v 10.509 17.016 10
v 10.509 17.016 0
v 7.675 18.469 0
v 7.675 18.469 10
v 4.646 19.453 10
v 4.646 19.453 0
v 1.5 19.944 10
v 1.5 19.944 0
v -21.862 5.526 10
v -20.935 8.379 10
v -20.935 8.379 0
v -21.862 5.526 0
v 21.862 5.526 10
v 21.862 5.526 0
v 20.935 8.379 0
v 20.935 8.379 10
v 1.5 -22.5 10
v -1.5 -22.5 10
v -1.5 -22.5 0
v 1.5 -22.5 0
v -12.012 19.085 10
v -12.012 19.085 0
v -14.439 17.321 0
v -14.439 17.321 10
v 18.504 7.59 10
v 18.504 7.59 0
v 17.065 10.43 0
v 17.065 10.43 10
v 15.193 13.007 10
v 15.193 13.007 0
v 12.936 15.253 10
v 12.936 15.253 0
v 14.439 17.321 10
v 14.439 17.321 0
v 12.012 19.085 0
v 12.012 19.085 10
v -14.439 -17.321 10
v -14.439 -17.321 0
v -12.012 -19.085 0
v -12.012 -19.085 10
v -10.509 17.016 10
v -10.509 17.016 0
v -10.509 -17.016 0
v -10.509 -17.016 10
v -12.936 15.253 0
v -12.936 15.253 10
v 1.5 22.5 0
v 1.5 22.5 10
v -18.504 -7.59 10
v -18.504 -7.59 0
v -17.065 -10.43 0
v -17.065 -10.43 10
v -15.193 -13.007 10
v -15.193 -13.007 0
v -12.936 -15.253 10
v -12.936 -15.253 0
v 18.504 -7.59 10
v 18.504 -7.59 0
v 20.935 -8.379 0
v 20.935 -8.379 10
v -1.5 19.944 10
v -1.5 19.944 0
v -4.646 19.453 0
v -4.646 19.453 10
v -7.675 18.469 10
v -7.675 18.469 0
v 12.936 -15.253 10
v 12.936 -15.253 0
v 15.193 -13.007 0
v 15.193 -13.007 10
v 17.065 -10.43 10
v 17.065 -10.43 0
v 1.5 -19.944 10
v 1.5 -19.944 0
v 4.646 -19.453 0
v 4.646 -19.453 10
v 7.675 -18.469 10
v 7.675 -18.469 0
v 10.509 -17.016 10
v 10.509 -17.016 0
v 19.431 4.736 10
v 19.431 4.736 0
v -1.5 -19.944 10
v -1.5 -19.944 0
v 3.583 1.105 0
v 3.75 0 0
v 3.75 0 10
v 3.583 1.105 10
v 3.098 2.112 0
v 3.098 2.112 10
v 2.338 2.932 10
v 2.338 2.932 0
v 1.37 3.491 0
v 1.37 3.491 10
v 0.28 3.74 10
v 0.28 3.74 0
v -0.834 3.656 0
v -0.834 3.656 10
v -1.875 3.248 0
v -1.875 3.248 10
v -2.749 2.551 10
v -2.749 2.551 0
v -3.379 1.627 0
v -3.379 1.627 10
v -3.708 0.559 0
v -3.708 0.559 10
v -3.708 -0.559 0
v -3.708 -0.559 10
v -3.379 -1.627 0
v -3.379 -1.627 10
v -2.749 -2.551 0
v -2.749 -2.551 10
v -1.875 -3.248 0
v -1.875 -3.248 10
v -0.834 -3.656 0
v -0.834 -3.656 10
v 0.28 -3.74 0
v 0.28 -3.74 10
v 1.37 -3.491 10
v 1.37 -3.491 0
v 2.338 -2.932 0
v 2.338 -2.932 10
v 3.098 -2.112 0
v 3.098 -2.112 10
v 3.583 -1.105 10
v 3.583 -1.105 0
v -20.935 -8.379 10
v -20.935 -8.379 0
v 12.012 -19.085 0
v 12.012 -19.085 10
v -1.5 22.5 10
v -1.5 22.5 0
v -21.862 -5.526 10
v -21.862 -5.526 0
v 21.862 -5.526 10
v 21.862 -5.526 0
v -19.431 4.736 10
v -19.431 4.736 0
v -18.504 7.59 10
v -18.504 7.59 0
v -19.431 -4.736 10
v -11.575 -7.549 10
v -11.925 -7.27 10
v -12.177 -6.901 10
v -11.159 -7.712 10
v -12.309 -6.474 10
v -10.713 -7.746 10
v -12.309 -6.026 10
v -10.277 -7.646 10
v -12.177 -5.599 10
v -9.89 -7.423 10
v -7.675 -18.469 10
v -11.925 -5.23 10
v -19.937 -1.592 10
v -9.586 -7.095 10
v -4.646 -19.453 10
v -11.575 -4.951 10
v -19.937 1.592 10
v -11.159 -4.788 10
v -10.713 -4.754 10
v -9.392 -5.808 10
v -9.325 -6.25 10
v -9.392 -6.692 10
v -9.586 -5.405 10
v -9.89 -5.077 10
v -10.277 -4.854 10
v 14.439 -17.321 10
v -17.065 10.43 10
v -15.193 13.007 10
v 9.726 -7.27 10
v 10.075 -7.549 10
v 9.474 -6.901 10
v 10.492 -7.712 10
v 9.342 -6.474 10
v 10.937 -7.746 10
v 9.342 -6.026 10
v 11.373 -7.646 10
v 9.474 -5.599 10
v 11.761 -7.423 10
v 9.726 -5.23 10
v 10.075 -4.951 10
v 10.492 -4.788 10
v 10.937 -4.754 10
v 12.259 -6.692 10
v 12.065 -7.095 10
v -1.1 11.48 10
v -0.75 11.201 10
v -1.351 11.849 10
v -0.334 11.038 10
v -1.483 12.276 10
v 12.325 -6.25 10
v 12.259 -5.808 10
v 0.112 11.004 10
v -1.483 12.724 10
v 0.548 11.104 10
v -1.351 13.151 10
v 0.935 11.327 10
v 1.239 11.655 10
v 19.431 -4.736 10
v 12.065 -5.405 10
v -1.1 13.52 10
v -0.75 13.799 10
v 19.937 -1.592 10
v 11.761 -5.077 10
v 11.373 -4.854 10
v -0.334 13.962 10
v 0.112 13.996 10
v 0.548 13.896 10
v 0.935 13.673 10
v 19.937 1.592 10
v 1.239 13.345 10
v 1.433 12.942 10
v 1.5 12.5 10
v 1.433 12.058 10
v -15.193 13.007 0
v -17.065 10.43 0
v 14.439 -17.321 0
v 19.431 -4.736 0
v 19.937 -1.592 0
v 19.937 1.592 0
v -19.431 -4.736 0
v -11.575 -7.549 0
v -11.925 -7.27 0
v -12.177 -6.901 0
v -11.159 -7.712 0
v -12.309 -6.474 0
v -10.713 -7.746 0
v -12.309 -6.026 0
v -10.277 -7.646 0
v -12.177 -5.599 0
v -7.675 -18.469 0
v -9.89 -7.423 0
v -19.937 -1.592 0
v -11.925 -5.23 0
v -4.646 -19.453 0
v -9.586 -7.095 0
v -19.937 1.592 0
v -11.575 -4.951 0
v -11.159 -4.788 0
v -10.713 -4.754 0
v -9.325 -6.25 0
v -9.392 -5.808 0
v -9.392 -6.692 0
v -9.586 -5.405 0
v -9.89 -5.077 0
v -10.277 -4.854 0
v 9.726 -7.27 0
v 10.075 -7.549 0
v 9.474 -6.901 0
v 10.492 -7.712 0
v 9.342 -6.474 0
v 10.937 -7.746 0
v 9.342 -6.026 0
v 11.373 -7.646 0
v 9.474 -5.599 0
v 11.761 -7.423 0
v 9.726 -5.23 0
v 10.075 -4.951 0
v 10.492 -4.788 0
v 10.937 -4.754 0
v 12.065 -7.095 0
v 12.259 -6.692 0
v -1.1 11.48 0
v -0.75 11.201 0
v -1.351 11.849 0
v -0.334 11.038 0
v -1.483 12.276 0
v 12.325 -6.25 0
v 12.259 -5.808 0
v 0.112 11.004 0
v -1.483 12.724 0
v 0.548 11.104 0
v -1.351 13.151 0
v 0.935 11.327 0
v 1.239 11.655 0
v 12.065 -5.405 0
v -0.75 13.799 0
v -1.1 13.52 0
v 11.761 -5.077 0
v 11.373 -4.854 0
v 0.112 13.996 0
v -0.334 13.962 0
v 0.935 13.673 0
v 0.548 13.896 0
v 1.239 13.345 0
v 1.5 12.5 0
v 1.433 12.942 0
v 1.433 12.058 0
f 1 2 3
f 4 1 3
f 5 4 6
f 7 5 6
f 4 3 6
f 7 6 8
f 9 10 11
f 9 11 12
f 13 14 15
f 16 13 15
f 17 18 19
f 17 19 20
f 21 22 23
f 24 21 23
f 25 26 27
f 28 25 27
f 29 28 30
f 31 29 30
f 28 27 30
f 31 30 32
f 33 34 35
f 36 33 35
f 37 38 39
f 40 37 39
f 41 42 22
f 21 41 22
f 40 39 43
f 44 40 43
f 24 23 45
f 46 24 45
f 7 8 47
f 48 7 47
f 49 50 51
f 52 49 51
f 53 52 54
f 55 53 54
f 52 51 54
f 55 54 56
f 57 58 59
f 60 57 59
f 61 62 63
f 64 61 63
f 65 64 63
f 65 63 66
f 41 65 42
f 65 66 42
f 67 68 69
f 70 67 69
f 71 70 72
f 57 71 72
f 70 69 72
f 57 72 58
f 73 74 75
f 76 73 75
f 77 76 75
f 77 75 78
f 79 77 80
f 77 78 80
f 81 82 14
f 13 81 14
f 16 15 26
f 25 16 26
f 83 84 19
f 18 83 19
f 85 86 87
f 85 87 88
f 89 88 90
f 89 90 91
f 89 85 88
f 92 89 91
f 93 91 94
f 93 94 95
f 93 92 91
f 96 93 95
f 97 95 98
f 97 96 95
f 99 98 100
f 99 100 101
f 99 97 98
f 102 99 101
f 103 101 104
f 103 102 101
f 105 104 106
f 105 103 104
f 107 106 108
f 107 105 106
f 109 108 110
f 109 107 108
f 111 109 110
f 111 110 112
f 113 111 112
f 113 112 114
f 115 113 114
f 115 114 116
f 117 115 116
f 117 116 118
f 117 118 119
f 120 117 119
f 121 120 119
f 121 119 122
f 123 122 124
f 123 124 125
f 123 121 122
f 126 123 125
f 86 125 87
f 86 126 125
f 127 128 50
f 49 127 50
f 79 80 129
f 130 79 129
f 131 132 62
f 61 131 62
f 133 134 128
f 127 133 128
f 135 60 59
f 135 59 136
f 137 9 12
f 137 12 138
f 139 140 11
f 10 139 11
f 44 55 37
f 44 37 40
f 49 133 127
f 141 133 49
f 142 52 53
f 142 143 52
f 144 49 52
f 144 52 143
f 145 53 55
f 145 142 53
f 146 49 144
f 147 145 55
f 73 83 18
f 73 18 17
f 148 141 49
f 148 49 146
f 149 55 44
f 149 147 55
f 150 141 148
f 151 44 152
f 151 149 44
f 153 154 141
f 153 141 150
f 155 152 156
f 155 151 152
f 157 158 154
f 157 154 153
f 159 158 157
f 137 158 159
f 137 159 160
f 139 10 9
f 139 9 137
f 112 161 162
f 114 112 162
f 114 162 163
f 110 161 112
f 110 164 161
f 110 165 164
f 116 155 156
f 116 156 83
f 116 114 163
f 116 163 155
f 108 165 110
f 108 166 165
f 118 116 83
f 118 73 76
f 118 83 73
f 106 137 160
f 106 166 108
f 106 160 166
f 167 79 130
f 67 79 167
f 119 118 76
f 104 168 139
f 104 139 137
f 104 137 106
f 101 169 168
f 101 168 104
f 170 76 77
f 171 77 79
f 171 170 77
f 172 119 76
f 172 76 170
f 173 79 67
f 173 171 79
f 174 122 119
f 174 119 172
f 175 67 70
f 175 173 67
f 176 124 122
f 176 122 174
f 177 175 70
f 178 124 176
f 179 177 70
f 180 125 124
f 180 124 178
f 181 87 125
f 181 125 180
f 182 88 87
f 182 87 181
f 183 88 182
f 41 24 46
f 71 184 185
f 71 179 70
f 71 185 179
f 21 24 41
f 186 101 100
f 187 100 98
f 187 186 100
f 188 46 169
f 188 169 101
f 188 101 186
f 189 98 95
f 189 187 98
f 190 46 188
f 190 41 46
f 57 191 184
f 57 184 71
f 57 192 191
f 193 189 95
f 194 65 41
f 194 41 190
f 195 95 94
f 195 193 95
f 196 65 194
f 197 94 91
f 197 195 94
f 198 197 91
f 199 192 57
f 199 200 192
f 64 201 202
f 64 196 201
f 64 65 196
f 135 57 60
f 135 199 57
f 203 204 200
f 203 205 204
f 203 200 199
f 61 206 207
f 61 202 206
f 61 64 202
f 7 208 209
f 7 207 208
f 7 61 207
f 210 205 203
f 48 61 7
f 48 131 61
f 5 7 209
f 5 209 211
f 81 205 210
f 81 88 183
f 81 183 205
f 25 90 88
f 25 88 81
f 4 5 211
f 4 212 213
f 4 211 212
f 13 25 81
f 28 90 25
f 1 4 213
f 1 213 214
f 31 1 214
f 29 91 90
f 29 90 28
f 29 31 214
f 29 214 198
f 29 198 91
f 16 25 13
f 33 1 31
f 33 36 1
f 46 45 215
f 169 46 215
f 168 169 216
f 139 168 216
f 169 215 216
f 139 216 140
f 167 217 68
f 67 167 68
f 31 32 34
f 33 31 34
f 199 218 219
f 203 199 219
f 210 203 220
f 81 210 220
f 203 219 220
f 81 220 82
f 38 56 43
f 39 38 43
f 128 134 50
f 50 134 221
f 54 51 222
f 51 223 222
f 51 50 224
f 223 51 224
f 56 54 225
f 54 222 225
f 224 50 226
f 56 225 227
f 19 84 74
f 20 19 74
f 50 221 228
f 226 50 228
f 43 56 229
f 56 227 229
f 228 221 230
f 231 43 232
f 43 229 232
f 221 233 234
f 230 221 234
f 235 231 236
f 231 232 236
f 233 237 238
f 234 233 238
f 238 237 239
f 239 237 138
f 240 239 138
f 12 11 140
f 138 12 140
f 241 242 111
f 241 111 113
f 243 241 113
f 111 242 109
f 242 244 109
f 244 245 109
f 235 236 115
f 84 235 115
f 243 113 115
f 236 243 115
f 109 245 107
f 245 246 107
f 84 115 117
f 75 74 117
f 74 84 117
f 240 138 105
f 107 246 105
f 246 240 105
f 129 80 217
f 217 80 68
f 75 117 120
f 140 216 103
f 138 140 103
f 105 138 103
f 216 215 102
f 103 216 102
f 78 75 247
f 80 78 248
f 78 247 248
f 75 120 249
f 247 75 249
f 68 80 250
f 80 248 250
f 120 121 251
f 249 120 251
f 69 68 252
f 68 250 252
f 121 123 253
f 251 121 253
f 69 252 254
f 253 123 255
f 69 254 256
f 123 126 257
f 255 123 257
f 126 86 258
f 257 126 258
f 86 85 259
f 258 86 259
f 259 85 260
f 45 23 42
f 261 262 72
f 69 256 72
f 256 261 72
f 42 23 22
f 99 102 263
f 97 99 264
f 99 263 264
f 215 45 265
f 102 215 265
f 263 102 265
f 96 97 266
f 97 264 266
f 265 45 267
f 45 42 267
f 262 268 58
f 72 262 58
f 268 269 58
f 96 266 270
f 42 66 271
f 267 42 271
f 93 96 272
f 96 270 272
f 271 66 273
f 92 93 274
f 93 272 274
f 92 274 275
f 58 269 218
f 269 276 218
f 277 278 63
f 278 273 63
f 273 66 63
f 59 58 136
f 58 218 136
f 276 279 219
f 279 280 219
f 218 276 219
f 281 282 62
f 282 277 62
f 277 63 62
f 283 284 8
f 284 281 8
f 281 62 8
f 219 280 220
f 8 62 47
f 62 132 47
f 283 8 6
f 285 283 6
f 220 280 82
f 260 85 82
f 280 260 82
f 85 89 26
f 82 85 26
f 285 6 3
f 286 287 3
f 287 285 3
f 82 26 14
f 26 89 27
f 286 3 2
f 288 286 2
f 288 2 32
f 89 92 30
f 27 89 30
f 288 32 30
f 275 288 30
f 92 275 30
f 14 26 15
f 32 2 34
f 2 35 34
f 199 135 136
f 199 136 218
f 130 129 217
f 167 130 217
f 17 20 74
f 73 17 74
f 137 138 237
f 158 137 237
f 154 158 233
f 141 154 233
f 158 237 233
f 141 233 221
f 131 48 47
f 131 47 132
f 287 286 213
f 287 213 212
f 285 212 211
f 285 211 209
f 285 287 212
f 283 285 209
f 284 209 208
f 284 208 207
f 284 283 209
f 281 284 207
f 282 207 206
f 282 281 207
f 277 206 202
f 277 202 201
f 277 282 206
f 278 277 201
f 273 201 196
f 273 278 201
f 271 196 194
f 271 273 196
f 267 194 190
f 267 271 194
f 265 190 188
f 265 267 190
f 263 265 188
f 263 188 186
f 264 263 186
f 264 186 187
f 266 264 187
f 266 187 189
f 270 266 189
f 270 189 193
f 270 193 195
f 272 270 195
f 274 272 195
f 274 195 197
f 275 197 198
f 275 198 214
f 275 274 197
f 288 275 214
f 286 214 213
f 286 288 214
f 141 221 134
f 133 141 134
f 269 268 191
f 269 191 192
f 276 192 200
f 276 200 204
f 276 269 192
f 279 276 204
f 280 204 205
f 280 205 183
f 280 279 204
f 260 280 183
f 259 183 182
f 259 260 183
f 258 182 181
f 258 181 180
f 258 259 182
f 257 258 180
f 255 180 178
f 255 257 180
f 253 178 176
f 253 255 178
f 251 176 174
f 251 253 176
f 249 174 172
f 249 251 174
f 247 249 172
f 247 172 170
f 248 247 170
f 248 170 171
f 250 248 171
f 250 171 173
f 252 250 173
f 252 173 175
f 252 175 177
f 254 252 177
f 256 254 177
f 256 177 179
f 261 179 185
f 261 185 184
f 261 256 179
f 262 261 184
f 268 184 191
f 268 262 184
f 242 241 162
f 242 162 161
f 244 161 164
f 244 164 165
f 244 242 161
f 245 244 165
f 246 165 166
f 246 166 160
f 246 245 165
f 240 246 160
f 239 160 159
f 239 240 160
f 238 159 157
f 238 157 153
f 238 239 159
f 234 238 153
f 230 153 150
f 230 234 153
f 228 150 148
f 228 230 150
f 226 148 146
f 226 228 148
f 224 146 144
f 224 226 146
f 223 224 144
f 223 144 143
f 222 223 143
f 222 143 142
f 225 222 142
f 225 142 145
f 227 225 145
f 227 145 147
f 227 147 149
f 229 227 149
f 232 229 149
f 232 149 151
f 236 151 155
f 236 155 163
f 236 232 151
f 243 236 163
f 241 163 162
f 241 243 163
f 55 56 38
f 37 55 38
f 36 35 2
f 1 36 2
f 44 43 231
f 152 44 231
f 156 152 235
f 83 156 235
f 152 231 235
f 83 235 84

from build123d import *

# Parameters (mm, degrees)
SKETCH_1_R          = 1.5
EXTRUDE_1_DEPTH     = 10
SKETCH_2_R          = 3.75
CUT_EXTRUDE_1_DEPTH = 10


with BuildPart() as part:
    # 草图1 → 凸台-拉伸1 (new body)
    with BuildSketch(Plane.XY):
        with BuildLine():
            Line((1.5, 19.943670675), (1.5, 22.5))
            Line((1.5, 22.5), (-1.5, 22.5))
            Line((-1.5, 22.5), (-1.5, 19.943670675))
            ThreePointArc((-1.5, 19.943670675), (-6.180339887, 19.021130326), (-10.509070008, 17.016446385))
            Line((-10.509070008, 17.016446385), (-12.011642685, 19.084560252))
            Line((-12.011642685, 19.084560252), (-14.438693668, 17.321204495))
            Line((-14.438693668, 17.321204495), (-12.936120991, 15.253090628))
            ThreePointArc((-12.936120991, 15.253090628), (-16.180339887, 11.755705046), (-18.504032463, 7.589517943))
            Line((-18.504032463, 7.589517943), (-20.935246125, 8.379467148))
            Line((-20.935246125, 8.379467148), (-21.862297108, 5.526297599))
            Line((-21.862297108, 5.526297599), (-19.431083446, 4.736348394))
            ThreePointArc((-19.431083446, 4.736348394), (-20, 0), (-19.431083446, -4.736348394))
            Line((-19.431083446, -4.736348394), (-21.862297108, -5.526297599))
            Line((-21.862297108, -5.526297599), (-20.935246125, -8.379467148))
            Line((-20.935246125, -8.379467148), (-18.504032463, -7.589517943))
            ThreePointArc((-18.504032463, -7.589517943), (-16.180339887, -11.755705046), (-12.936120991, -15.253090628))
            Line((-12.936120991, -15.253090628), (-14.438693668, -17.321204495))
            Line((-14.438693668, -17.321204495), (-12.011642685, -19.084560252))
            Line((-12.011642685, -19.084560252), (-10.509070008, -17.016446385))
            ThreePointArc((-10.509070008, -17.016446385), (-6.180339887, -19.021130326), (-1.5, -19.943670675))
            Line((-1.5, -19.943670675), (-1.5, -22.5))
            Line((-1.5, -22.5), (1.5, -22.5))
            Line((1.5, -22.5), (1.5, -19.943670675))
            ThreePointArc((1.5, -19.943670675), (6.180339887, -19.021130326), (10.509070008, -17.016446385))
            Line((10.509070008, -17.016446385), (12.011642685, -19.084560252))
            Line((12.011642685, -19.084560252), (14.438693668, -17.321204495))
            Line((14.438693668, -17.321204495), (12.936120991, -15.253090628))
            ThreePointArc((12.936120991, -15.253090628), (16.180339887, -11.755705046), (18.504032463, -7.589517943))
            Line((18.504032463, -7.589517943), (20.935246125, -8.379467148))
            Line((20.935246125, -8.379467148), (21.862297108, -5.526297599))
            Line((21.862297108, -5.526297599), (19.431083446, -4.736348394))
            ThreePointArc((19.431083446, -4.736348394), (20, 0), (19.431083446, 4.736348394))
            Line((19.431083446, 4.736348394), (21.862297108, 5.526297599))
            Line((21.862297108, 5.526297599), (20.935246125, 8.379467148))
            Line((20.935246125, 8.379467148), (18.504032463, 7.589517943))
            ThreePointArc((18.504032463, 7.589517943), (16.180339887, 11.755705046), (12.936120991, 15.253090628))
            Line((12.936120991, 15.253090628), (14.438693668, 17.321204495))
            Line((14.438693668, 17.321204495), (12.011642685, 19.084560252))
            Line((12.011642685, 19.084560252), (10.509070008, 17.016446385))
            ThreePointArc((10.509070008, 17.016446385), (6.180339887, 19.021130326), (1.5, 19.943670675))
        make_face()
        with Locations((0, 12.5)):
            Circle(SKETCH_1_R, mode=Mode.SUBTRACT)
        with Locations((10.825317547, -6.25)):
            Circle(SKETCH_1_R, mode=Mode.SUBTRACT)
        with Locations((-10.825317547, -6.25)):
            Circle(SKETCH_1_R, mode=Mode.SUBTRACT)
    extrude(amount=EXTRUDE_1_DEPTH)

    # 草图2 → 切除-拉伸1 (cut)
    with BuildSketch(Plane.XY):
        Circle(SKETCH_2_R)
    extrude(amount=CUT_EXTRUDE_1_DEPTH, mode=Mode.SUBTRACT)


solid = part.part
